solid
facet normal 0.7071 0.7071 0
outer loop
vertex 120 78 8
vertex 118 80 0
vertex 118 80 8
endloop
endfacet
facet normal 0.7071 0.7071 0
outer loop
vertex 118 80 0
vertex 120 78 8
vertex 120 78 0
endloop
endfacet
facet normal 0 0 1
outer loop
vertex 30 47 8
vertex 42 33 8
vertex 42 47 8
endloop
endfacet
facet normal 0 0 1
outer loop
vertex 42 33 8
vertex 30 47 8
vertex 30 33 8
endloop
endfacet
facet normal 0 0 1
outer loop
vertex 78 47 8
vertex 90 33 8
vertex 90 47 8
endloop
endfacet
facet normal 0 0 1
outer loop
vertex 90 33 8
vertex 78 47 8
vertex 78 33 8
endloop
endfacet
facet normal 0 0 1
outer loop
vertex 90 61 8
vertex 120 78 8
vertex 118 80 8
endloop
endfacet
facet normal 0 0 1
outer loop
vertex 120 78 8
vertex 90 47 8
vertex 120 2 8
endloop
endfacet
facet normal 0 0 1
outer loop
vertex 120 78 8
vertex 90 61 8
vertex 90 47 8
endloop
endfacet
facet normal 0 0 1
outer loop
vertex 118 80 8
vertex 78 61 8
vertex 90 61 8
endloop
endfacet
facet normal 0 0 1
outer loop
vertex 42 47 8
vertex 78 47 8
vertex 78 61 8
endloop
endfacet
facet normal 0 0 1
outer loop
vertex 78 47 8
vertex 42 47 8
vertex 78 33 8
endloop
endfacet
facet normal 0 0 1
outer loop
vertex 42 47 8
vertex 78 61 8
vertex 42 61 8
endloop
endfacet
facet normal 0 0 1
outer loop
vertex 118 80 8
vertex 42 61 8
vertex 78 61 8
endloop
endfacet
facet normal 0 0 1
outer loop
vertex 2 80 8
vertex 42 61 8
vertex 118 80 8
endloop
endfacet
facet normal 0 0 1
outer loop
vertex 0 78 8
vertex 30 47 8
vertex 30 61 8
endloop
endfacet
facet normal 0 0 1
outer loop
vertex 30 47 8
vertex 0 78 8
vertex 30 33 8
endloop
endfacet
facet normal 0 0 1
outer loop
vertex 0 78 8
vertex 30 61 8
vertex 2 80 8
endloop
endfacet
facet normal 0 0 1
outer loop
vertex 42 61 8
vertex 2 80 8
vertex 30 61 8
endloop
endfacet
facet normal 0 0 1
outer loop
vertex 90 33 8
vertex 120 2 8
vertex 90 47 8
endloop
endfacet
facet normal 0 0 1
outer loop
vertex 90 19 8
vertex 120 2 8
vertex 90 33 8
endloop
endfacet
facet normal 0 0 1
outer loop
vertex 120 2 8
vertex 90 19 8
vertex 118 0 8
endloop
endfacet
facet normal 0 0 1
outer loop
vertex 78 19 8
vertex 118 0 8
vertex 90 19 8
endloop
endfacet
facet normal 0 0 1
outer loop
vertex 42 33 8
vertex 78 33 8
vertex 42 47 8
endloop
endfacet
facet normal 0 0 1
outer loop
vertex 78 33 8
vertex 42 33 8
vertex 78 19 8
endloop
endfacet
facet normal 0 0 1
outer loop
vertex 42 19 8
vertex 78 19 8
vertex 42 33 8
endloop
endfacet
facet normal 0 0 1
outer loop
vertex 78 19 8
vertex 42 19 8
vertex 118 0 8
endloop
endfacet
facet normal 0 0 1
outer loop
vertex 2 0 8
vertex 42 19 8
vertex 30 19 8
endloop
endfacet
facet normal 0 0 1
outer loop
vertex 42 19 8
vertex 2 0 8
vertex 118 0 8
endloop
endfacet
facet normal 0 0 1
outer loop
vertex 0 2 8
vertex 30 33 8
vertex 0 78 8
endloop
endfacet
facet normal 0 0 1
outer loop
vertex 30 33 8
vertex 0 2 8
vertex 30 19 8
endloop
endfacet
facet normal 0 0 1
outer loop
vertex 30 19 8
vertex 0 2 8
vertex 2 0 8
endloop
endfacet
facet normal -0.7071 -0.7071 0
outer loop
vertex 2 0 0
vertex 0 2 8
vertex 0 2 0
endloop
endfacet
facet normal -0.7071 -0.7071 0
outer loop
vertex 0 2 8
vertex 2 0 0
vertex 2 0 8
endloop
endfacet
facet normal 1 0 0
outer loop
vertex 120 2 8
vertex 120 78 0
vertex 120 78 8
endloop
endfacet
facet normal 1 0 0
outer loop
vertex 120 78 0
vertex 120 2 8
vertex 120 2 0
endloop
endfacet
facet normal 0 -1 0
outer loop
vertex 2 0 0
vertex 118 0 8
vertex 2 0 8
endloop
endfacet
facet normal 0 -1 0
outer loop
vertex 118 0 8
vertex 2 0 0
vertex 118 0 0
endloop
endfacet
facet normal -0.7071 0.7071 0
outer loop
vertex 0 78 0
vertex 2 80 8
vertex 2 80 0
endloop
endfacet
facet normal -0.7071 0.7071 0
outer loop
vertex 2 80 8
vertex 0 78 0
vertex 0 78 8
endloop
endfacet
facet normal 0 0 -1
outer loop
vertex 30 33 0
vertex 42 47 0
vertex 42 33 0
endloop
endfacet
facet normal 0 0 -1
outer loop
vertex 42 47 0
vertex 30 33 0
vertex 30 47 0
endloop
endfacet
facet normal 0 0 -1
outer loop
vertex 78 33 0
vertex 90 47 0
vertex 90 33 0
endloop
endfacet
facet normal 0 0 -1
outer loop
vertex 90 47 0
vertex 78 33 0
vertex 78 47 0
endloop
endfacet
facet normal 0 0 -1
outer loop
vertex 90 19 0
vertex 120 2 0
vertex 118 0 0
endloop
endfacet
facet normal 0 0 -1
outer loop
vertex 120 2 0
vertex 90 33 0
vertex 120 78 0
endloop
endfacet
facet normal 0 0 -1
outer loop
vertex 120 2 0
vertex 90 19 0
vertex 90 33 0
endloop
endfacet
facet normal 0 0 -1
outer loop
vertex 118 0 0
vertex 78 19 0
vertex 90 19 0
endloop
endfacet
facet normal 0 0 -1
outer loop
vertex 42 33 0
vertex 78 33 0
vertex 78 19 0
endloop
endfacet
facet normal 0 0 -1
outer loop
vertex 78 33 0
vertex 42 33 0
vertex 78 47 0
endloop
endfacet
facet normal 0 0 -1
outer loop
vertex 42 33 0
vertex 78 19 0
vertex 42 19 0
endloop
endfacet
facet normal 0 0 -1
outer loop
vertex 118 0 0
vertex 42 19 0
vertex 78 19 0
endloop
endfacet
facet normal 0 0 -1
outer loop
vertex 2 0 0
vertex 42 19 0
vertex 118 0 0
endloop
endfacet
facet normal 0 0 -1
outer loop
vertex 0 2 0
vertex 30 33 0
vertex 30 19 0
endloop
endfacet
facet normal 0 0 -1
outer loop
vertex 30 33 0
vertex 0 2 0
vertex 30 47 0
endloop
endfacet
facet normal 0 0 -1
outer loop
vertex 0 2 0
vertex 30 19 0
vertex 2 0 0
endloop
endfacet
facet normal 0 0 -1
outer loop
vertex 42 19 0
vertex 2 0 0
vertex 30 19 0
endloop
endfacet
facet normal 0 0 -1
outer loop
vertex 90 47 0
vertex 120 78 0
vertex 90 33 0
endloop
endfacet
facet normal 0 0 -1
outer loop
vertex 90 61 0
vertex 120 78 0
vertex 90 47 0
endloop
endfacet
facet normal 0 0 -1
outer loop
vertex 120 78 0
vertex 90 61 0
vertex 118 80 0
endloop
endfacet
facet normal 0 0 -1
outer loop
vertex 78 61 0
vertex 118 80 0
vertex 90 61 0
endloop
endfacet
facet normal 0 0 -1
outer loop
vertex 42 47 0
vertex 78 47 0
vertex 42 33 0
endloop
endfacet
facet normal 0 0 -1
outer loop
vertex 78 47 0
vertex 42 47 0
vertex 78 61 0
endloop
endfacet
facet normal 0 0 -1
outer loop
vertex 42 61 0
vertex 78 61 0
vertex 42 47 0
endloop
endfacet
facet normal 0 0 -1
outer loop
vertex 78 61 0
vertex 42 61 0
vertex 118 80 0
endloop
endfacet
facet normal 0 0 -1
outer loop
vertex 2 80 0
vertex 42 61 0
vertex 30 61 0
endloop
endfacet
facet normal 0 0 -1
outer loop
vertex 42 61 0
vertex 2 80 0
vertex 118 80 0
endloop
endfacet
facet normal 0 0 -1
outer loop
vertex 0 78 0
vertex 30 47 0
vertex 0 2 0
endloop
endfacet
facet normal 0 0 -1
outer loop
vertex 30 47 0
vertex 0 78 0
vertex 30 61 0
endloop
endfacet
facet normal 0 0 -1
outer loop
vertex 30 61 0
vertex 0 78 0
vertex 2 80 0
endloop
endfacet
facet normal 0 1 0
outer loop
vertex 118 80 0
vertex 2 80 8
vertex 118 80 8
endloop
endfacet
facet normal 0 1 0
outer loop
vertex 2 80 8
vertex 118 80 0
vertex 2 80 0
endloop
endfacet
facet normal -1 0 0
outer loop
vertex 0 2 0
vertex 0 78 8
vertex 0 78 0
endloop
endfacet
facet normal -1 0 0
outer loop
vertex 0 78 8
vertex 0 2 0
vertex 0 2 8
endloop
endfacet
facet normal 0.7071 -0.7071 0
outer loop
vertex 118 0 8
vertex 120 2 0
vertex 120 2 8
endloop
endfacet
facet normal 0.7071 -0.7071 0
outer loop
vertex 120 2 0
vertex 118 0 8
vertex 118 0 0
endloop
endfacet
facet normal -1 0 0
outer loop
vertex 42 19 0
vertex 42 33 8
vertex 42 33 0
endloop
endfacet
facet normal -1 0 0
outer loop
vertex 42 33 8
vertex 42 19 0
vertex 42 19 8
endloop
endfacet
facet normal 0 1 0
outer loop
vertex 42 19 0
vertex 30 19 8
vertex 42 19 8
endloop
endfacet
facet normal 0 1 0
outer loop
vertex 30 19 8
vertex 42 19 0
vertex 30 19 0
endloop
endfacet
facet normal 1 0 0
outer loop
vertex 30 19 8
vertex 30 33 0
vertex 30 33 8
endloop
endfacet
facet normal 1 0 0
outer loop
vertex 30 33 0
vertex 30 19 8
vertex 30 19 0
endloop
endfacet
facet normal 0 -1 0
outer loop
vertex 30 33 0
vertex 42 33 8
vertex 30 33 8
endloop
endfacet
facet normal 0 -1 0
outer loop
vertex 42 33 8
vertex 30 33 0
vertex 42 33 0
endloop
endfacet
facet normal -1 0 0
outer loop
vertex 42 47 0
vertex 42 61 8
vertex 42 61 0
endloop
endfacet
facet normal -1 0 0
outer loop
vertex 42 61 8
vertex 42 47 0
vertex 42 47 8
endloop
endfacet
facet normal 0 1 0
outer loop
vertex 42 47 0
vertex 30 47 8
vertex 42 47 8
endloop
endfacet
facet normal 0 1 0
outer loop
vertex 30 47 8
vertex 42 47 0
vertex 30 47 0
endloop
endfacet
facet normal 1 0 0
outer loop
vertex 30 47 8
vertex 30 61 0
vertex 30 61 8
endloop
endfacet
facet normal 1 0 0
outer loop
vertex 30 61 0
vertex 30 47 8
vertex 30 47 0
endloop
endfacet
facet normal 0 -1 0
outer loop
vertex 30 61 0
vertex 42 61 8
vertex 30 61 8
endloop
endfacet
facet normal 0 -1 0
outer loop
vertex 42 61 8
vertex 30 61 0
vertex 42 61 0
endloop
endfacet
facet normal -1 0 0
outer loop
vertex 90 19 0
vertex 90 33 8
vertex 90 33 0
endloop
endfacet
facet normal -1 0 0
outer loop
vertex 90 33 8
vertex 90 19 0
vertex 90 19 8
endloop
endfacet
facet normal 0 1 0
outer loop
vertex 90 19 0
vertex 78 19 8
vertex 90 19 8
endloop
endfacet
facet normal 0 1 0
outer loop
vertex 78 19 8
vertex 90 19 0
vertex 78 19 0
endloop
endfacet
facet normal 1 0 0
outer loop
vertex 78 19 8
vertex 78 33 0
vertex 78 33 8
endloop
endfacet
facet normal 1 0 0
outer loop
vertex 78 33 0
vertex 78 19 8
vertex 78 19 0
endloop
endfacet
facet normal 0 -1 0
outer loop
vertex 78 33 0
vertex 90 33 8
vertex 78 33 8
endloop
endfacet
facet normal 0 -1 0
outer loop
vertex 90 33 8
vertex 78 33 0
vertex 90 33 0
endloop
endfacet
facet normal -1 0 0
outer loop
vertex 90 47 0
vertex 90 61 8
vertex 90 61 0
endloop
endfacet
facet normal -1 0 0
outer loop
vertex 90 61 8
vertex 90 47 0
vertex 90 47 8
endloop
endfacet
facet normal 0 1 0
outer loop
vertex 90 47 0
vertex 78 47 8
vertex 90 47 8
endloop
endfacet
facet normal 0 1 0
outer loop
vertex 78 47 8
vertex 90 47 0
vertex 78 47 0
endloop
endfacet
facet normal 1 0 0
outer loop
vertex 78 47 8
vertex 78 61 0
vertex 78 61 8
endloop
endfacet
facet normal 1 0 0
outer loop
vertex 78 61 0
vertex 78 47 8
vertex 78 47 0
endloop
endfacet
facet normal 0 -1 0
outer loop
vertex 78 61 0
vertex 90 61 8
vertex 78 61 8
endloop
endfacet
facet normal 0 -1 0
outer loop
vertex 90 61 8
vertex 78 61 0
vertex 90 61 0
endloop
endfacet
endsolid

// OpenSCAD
$fn = 32;

// ----------------------------------------------------------------------
// Windowed plate: 4 voids, 120 x 80 x 8 mm
// ----------------------------------------------------------------------

// --- parameters (mm) ---
plate_l = 120;            // plate length, X
plate_w = 80;             // plate width, Y
plate_t = 8;              // plate thickness, Z
edge_margin = 12;         // wall from the plate edge to any window
win_l = 12;               // pocket length
win_w = 14;               // pocket width
pitch_x = 48;             // grid pitch along X
pitch_y = 28;             // grid pitch along Y
depth_1 = 8;              // depth of void 1 (full thickness = through)
depth_2 = 8;              // depth of void 2 (full thickness = through)
depth_3 = 8;              // depth of void 3 (full thickness = through)
depth_4 = 8;              // depth of void 4 (full thickness = through)
corner_c = 2;             // corner chamfer of the plate

profile = [[2, 0], [118, 0], [120, 2], [120, 78], [118, 80], [2, 80], [0, 78], [0, 2]];  // primary outline, 8 points, counter clockwise
void_1 = [[30, 19], [42, 19], [42, 33], [30, 33]];  // pocket at grid node 0,0, 4 points
void_2 = [[30, 47], [42, 47], [42, 61], [30, 61]];  // pocket at grid node 0,1, 4 points
void_3 = [[78, 19], [90, 19], [90, 33], [78, 33]];  // pocket at grid node 1,0, 4 points
void_4 = [[78, 47], [90, 47], [90, 61], [78, 61]];  // pocket at grid node 1,1, 4 points

// --- the one profile operation ---
difference() {
  linear_extrude(height = plate_t) polygon(points = profile);
  translate([0, 0, -1])
    linear_extrude(height = plate_t + 2) polygon(points = void_1);
  translate([0, 0, -1])
    linear_extrude(height = plate_t + 2) polygon(points = void_2);
  translate([0, 0, -1])
    linear_extrude(height = plate_t + 2) polygon(points = void_3);
  translate([0, 0, -1])
    linear_extrude(height = plate_t + 2) polygon(points = void_4);
}
